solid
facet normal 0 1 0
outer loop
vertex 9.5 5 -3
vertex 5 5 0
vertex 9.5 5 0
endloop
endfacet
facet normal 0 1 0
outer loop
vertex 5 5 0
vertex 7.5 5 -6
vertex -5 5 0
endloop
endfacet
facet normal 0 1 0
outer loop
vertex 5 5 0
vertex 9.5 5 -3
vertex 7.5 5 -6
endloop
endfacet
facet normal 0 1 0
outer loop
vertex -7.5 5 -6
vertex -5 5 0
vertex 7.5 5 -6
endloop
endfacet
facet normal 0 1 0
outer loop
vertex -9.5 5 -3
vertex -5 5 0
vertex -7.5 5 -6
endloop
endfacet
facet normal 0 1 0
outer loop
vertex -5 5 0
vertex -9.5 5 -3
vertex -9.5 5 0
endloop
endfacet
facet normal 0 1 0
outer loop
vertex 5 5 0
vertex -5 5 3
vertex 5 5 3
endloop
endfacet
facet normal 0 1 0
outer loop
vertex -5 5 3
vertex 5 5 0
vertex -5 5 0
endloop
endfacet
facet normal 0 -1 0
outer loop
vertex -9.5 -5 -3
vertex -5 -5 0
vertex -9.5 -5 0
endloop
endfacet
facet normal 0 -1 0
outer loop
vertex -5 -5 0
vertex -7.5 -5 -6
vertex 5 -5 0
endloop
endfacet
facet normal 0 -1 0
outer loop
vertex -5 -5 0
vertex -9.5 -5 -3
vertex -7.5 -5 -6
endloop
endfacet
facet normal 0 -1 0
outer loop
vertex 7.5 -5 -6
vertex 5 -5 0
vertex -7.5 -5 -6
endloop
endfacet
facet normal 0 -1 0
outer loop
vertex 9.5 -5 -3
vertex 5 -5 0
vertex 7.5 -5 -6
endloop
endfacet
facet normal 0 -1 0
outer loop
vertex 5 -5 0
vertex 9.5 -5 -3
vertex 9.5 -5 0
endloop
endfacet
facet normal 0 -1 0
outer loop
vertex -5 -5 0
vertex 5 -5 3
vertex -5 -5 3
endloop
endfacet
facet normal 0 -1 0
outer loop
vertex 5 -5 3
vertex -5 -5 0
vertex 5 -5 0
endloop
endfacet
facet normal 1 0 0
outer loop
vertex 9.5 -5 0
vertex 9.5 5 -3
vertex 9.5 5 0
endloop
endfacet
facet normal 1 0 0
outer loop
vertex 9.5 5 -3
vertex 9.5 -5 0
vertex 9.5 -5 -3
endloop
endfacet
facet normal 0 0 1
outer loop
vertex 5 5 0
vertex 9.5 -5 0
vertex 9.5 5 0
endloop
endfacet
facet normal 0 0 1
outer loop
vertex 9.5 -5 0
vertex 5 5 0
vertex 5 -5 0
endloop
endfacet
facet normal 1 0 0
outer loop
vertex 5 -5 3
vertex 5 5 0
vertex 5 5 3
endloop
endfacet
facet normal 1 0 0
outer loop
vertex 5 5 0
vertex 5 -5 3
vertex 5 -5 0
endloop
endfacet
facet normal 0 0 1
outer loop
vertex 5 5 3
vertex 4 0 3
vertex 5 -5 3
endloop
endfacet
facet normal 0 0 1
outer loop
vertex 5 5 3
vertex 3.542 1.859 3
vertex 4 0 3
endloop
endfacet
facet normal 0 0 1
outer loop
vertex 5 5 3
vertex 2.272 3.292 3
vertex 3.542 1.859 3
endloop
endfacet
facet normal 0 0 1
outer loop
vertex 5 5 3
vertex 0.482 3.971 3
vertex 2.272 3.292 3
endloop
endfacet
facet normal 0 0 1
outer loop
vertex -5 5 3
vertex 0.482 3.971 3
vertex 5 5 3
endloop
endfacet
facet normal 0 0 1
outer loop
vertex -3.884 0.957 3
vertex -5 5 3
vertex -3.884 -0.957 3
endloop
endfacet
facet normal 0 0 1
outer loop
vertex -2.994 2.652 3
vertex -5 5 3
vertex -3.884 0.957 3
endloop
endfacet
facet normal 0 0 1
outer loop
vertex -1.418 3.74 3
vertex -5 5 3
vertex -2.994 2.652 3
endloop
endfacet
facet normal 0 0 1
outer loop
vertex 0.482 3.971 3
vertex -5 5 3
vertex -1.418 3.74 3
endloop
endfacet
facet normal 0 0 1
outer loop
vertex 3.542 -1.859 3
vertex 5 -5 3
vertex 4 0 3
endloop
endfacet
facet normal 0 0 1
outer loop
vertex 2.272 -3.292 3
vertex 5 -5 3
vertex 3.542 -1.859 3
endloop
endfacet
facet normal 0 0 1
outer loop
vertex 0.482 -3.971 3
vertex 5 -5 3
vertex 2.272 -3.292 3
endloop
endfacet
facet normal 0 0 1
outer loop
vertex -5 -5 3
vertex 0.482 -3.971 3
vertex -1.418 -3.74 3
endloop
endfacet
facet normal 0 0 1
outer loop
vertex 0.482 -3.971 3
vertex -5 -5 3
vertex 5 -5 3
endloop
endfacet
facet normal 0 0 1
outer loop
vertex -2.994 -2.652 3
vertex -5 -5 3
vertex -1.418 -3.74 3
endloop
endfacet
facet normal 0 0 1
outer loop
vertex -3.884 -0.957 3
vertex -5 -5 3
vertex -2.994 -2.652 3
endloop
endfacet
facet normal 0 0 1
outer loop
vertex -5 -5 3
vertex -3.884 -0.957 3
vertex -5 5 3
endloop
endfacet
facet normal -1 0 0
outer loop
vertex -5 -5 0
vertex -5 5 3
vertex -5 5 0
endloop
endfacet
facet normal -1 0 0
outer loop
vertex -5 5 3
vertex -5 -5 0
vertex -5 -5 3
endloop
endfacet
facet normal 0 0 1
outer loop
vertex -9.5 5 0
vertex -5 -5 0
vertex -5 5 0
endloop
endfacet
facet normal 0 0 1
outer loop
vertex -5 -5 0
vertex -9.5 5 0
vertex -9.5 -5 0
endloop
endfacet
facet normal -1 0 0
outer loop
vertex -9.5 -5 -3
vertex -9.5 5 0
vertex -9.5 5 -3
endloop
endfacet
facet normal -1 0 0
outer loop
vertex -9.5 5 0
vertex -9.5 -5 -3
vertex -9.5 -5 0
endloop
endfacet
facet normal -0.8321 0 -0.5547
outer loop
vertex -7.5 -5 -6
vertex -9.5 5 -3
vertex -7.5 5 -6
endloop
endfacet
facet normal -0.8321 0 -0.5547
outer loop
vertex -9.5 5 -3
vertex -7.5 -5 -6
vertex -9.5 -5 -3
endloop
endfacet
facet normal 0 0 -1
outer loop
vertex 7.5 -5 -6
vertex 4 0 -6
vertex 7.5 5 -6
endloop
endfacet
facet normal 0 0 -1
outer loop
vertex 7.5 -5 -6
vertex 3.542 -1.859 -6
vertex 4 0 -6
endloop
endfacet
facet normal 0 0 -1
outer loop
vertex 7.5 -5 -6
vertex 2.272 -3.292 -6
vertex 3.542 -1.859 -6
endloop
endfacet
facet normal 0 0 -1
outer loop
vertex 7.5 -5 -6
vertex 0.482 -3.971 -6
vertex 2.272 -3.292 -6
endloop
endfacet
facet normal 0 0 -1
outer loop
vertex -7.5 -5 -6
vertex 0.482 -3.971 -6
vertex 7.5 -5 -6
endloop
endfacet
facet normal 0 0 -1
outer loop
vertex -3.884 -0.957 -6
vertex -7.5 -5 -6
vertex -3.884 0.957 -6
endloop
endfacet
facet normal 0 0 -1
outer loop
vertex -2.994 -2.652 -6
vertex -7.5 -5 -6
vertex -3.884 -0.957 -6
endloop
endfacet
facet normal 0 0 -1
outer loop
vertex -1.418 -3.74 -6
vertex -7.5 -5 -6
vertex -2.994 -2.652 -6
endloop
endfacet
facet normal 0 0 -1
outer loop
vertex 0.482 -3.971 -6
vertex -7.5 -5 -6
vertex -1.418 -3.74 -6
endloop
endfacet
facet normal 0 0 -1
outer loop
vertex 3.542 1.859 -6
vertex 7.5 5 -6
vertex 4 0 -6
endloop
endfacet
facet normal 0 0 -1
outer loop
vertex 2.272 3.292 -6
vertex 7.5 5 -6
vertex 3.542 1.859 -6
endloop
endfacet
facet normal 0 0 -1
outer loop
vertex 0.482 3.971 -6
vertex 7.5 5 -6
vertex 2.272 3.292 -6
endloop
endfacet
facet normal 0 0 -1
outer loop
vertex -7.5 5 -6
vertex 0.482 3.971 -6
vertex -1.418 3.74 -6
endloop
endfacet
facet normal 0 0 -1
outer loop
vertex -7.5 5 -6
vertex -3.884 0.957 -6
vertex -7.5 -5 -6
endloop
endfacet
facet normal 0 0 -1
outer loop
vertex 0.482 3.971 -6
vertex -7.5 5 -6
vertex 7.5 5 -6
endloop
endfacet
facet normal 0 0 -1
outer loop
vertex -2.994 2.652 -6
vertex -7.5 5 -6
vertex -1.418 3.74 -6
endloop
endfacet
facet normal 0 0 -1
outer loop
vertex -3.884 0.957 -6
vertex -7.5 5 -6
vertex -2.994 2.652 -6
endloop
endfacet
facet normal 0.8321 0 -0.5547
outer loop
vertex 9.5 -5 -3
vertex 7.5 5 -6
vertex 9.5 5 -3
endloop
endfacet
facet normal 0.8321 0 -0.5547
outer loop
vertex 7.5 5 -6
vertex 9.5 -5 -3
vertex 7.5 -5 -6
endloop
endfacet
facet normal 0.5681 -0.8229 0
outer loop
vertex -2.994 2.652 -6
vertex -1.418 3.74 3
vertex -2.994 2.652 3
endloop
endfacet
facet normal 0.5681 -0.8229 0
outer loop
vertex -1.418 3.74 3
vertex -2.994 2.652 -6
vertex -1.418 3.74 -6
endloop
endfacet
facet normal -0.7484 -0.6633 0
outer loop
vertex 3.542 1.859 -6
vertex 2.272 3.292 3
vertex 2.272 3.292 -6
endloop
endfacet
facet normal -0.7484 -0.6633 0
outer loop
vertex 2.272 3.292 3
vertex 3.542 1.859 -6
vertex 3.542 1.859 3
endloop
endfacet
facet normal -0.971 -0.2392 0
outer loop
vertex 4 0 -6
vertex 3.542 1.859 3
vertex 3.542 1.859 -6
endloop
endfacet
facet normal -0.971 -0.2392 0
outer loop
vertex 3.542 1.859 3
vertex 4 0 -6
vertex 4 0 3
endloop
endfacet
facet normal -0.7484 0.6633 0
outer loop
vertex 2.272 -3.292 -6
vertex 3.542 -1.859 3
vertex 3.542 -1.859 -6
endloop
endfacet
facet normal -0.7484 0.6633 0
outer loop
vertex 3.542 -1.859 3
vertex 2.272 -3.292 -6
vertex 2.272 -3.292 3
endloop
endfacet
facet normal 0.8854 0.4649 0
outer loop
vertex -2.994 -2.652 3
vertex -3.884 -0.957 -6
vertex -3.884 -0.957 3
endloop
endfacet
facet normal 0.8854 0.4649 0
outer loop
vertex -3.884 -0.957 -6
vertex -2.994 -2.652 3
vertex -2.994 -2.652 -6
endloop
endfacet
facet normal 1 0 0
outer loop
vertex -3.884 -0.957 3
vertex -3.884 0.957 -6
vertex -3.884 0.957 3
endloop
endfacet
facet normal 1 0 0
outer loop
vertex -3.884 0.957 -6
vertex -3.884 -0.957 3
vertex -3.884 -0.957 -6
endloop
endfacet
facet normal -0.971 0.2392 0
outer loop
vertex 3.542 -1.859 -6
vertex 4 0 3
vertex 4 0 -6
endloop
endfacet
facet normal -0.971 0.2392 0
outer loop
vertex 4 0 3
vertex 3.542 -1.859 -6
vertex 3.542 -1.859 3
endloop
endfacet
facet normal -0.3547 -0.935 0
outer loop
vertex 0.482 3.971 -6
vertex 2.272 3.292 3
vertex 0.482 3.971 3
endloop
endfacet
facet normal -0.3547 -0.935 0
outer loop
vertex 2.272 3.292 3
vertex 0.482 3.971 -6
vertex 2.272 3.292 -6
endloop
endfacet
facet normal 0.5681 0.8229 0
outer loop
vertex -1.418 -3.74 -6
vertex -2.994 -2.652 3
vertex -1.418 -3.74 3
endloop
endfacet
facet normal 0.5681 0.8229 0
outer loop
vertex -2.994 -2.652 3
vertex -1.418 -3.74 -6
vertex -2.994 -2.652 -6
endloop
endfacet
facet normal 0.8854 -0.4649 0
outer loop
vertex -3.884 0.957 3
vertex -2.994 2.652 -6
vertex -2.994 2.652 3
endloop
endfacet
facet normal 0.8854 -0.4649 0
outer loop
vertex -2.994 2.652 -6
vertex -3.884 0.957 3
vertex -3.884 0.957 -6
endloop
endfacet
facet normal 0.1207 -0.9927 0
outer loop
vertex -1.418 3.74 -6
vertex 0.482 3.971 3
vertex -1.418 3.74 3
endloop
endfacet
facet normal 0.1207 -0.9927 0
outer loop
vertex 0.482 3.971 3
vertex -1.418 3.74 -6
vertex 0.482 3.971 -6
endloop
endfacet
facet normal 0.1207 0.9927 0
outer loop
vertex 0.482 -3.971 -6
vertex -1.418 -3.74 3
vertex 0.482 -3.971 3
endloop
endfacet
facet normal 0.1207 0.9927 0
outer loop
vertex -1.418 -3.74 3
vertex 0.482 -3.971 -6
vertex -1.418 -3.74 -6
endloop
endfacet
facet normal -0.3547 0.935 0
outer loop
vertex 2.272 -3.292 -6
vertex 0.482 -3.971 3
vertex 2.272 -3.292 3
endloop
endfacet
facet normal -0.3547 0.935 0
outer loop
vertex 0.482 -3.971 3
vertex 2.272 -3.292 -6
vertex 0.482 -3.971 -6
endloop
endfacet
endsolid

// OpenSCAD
module t_nut(){
    render()difference(){
        
        rotate(a=90, v=[1,0,0])translate([0,0,-5])linear_extrude(height=10)polygon(points=[[5,3],[5,0],[9.5,0],[9.5,-3],[7.5, -6],[-7.5,-6],[-9.5,-3],[-9.5,0],[-5,0],[-5,3]]);
        
        translate([0,0,-8])cylinder(h=16, r=4);
    }
}

t_nut();
